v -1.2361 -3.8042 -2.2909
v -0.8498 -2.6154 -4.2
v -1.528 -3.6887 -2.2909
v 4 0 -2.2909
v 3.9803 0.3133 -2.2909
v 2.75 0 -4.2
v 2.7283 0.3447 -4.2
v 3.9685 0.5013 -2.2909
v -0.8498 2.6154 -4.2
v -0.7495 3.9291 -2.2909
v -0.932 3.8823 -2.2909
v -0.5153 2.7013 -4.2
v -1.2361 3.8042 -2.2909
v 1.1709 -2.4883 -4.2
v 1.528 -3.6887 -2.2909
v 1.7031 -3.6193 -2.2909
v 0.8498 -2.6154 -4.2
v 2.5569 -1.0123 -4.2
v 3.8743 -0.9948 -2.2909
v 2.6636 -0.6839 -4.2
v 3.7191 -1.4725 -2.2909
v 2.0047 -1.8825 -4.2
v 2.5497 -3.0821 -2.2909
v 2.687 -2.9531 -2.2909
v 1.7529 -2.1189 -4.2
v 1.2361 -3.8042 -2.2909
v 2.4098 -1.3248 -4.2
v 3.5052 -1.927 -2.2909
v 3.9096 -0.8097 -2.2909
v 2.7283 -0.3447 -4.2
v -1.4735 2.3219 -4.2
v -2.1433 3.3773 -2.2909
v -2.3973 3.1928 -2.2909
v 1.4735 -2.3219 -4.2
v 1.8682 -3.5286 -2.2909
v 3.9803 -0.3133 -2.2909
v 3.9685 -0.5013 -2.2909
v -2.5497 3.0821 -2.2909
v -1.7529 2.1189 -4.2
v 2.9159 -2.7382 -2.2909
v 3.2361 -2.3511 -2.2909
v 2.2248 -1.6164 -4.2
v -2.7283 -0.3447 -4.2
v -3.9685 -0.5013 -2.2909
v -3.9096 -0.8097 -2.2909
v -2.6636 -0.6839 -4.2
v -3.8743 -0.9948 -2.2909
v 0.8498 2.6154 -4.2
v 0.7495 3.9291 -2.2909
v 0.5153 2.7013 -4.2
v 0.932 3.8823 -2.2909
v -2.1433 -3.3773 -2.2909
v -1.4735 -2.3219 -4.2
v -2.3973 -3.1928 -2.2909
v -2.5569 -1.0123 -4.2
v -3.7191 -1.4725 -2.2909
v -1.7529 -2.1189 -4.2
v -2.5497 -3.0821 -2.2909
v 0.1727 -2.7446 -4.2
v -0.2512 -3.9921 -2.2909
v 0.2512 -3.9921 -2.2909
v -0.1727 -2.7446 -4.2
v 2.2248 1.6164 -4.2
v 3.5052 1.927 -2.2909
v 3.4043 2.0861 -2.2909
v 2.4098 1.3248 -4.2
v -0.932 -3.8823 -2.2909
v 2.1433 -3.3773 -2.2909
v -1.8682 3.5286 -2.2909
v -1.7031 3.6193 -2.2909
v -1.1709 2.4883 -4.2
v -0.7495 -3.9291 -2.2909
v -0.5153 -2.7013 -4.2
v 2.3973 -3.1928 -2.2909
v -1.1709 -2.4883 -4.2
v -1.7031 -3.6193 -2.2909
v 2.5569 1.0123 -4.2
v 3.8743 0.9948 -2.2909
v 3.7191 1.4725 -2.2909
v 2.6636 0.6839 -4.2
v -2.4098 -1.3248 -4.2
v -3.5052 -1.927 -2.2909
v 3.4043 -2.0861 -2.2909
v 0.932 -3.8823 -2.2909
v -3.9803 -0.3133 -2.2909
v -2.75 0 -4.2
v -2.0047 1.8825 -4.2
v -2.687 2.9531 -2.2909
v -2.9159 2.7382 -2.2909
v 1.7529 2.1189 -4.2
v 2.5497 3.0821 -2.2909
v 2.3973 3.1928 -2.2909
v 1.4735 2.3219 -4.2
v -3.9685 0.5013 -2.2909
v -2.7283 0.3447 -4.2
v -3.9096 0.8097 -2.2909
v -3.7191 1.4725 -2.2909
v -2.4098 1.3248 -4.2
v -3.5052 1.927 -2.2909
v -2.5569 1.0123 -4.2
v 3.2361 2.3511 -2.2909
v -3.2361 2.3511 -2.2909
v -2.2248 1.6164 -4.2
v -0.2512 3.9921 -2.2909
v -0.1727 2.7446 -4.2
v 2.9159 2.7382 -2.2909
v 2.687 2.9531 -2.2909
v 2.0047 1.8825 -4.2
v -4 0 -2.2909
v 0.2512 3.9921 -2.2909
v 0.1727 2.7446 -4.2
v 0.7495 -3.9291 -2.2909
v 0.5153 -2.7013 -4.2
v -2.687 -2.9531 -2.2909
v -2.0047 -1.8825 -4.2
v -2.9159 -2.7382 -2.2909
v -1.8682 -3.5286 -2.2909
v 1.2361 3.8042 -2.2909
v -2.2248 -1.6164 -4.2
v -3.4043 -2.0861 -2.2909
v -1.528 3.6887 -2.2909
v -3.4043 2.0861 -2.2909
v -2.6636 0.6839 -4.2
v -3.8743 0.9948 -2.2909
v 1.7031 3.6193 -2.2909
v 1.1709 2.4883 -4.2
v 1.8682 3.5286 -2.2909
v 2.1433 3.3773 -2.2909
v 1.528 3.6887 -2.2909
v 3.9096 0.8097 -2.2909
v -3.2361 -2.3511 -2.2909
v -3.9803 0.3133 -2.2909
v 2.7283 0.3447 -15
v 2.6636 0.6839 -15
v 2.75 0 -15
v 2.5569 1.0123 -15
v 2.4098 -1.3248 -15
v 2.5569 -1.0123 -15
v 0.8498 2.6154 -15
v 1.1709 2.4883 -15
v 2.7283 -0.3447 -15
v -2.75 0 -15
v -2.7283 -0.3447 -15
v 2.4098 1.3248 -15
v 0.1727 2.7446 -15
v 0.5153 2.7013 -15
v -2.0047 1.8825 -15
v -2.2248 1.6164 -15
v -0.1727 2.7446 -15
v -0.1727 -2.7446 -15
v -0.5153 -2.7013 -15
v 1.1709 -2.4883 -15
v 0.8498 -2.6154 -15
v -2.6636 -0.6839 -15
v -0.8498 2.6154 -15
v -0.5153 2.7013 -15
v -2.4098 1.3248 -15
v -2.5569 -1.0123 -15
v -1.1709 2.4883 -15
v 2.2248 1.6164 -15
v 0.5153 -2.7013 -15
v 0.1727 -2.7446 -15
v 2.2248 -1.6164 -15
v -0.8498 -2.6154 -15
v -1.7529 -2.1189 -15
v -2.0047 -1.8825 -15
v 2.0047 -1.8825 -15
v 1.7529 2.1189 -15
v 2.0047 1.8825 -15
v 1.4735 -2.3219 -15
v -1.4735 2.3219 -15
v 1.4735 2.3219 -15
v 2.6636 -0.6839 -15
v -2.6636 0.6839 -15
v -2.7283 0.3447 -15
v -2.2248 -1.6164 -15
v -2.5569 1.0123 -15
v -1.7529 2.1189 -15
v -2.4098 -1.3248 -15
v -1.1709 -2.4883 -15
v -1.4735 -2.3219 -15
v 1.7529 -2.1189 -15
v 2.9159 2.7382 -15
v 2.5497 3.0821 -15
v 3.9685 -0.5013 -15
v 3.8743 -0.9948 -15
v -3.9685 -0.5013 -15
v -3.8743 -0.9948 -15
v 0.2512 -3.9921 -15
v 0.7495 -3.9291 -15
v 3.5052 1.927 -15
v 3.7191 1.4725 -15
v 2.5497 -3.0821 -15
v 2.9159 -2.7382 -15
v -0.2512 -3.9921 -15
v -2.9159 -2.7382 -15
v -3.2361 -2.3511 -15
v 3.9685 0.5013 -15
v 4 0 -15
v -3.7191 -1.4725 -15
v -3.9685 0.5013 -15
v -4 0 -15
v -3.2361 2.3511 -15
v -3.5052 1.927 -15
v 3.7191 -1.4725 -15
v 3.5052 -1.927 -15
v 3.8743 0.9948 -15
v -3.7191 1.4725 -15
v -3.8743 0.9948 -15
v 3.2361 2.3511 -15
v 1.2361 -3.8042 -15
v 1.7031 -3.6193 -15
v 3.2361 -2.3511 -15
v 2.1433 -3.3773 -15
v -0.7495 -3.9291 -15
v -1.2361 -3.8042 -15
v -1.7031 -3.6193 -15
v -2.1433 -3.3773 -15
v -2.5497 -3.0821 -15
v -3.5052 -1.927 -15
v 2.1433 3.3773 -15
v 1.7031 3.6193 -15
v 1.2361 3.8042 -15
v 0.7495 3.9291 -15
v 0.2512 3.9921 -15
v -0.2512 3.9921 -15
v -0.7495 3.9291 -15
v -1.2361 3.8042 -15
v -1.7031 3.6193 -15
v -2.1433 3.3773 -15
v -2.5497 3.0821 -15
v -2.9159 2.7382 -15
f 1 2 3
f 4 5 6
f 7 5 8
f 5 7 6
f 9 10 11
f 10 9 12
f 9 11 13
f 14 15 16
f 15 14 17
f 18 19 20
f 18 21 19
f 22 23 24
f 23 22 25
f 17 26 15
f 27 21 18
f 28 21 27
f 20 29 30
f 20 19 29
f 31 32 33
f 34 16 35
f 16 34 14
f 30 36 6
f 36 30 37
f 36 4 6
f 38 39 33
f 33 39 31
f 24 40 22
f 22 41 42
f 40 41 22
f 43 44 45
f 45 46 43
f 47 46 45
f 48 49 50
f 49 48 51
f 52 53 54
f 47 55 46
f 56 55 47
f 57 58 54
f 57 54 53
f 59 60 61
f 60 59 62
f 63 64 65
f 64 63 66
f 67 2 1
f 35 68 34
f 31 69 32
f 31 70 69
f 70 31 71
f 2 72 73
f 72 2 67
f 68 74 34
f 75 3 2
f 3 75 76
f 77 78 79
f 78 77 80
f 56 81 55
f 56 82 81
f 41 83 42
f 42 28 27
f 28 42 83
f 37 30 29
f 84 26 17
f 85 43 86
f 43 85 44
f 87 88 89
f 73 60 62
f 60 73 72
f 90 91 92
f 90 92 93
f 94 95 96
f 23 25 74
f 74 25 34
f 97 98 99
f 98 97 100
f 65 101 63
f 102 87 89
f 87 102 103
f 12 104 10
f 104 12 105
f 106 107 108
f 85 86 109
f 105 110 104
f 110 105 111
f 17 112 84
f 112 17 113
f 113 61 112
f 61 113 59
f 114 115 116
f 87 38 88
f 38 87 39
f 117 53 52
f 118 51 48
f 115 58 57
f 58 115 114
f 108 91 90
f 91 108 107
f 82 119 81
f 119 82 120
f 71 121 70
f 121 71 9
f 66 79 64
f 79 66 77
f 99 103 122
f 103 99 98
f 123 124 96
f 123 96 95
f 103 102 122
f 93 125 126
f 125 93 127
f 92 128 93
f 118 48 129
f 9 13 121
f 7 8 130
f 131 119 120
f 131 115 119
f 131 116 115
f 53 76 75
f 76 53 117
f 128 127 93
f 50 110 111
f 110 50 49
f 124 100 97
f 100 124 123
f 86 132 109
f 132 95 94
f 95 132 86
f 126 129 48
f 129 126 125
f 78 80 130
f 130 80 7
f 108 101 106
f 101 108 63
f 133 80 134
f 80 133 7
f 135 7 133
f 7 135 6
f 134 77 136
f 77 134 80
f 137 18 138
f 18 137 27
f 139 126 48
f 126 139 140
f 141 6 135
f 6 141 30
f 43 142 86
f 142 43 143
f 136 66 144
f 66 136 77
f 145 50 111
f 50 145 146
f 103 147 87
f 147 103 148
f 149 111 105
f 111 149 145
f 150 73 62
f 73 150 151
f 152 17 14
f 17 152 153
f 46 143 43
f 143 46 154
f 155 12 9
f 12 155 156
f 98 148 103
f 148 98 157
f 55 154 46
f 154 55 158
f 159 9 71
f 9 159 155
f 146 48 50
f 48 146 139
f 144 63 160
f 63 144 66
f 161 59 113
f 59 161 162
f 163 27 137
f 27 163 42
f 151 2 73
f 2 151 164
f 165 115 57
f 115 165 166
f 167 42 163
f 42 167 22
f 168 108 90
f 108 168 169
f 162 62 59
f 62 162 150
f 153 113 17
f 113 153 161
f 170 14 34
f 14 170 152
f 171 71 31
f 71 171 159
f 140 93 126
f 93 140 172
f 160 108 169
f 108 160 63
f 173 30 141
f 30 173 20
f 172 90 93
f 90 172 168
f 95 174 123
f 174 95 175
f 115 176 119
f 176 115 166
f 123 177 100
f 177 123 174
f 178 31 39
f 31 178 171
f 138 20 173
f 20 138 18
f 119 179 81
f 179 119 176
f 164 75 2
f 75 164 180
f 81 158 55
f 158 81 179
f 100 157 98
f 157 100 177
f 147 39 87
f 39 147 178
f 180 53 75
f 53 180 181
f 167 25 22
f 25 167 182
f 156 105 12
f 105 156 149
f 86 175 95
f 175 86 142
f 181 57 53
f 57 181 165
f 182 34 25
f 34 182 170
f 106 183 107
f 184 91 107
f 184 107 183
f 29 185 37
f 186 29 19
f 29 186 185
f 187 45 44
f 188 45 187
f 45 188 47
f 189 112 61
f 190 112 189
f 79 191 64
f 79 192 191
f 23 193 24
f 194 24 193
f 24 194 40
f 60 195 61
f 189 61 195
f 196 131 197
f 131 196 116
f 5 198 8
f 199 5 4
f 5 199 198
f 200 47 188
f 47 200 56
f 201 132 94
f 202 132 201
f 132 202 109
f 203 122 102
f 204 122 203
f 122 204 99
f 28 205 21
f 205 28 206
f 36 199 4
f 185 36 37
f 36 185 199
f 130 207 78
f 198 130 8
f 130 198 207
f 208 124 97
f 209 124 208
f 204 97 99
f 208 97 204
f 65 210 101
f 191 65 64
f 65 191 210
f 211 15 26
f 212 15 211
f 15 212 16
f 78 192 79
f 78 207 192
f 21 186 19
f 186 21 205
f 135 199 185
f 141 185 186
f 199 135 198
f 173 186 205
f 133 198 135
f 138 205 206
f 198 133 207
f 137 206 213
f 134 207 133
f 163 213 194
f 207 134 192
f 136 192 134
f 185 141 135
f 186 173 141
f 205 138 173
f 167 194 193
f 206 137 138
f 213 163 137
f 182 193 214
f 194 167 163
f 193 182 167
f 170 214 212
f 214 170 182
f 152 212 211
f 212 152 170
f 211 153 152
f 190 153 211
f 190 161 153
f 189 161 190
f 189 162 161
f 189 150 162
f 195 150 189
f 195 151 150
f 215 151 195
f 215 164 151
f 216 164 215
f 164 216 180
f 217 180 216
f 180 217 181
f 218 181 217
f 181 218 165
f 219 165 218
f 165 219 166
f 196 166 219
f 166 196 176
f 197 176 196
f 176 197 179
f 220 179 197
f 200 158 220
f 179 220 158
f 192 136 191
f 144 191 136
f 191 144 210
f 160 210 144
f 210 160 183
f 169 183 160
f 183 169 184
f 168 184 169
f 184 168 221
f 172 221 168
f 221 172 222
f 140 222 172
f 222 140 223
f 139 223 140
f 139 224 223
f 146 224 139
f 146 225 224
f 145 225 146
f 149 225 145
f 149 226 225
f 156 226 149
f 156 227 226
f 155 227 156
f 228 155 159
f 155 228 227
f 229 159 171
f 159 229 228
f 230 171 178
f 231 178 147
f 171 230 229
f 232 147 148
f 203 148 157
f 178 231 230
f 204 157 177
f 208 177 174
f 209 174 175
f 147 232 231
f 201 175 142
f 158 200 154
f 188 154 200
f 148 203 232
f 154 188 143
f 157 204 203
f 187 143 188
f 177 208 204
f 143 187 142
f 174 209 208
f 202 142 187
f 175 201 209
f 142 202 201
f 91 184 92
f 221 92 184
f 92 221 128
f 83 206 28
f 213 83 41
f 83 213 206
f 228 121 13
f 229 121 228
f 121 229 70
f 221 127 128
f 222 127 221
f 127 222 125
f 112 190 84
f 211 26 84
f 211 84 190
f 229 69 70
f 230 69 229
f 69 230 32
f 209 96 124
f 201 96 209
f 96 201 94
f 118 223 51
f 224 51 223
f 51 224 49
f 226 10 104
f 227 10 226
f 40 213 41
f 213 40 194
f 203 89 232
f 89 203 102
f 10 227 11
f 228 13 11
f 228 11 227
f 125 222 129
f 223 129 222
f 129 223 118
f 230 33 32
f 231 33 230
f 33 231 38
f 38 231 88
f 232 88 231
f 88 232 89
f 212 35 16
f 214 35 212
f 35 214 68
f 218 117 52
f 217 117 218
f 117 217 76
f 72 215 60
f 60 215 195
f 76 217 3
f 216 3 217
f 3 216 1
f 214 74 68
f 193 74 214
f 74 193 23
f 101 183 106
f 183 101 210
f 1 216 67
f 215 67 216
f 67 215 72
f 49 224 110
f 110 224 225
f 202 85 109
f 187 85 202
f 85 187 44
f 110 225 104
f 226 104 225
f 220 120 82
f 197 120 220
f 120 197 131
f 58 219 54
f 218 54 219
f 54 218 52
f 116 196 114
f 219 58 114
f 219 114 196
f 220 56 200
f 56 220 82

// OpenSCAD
$fn = 50;

difference() {
	union() {
		translate(v = [0, 0, -15.0]) {
			cylinder(h = 18, r = 4.0);
		}
	}
	union() {
		translate(v = [0, 0, 0]) {
			rotate(a = [0, 0, 0]) {
				difference() {
					union() {
						translate(v = [0, 0, -18.0]) {
							cylinder(h = 18, r = 2.25);
						}
						translate(v = [0, 0, -4.2]) {
							cylinder(h = 4.2, r1 = 2.75, r2 = 5.5);
						}
						translate(v = [0, 0, -18.0]) {
							cylinder(h = 18, r = 2.75);
						}
						translate(v = [0, 0, -18.0]) {
							cylinder(h = 18, r = 2.25);
						}
					}
					union();
				}
			}
		}
		#cylinder(h = 3, r = 6.25);
	}
}
